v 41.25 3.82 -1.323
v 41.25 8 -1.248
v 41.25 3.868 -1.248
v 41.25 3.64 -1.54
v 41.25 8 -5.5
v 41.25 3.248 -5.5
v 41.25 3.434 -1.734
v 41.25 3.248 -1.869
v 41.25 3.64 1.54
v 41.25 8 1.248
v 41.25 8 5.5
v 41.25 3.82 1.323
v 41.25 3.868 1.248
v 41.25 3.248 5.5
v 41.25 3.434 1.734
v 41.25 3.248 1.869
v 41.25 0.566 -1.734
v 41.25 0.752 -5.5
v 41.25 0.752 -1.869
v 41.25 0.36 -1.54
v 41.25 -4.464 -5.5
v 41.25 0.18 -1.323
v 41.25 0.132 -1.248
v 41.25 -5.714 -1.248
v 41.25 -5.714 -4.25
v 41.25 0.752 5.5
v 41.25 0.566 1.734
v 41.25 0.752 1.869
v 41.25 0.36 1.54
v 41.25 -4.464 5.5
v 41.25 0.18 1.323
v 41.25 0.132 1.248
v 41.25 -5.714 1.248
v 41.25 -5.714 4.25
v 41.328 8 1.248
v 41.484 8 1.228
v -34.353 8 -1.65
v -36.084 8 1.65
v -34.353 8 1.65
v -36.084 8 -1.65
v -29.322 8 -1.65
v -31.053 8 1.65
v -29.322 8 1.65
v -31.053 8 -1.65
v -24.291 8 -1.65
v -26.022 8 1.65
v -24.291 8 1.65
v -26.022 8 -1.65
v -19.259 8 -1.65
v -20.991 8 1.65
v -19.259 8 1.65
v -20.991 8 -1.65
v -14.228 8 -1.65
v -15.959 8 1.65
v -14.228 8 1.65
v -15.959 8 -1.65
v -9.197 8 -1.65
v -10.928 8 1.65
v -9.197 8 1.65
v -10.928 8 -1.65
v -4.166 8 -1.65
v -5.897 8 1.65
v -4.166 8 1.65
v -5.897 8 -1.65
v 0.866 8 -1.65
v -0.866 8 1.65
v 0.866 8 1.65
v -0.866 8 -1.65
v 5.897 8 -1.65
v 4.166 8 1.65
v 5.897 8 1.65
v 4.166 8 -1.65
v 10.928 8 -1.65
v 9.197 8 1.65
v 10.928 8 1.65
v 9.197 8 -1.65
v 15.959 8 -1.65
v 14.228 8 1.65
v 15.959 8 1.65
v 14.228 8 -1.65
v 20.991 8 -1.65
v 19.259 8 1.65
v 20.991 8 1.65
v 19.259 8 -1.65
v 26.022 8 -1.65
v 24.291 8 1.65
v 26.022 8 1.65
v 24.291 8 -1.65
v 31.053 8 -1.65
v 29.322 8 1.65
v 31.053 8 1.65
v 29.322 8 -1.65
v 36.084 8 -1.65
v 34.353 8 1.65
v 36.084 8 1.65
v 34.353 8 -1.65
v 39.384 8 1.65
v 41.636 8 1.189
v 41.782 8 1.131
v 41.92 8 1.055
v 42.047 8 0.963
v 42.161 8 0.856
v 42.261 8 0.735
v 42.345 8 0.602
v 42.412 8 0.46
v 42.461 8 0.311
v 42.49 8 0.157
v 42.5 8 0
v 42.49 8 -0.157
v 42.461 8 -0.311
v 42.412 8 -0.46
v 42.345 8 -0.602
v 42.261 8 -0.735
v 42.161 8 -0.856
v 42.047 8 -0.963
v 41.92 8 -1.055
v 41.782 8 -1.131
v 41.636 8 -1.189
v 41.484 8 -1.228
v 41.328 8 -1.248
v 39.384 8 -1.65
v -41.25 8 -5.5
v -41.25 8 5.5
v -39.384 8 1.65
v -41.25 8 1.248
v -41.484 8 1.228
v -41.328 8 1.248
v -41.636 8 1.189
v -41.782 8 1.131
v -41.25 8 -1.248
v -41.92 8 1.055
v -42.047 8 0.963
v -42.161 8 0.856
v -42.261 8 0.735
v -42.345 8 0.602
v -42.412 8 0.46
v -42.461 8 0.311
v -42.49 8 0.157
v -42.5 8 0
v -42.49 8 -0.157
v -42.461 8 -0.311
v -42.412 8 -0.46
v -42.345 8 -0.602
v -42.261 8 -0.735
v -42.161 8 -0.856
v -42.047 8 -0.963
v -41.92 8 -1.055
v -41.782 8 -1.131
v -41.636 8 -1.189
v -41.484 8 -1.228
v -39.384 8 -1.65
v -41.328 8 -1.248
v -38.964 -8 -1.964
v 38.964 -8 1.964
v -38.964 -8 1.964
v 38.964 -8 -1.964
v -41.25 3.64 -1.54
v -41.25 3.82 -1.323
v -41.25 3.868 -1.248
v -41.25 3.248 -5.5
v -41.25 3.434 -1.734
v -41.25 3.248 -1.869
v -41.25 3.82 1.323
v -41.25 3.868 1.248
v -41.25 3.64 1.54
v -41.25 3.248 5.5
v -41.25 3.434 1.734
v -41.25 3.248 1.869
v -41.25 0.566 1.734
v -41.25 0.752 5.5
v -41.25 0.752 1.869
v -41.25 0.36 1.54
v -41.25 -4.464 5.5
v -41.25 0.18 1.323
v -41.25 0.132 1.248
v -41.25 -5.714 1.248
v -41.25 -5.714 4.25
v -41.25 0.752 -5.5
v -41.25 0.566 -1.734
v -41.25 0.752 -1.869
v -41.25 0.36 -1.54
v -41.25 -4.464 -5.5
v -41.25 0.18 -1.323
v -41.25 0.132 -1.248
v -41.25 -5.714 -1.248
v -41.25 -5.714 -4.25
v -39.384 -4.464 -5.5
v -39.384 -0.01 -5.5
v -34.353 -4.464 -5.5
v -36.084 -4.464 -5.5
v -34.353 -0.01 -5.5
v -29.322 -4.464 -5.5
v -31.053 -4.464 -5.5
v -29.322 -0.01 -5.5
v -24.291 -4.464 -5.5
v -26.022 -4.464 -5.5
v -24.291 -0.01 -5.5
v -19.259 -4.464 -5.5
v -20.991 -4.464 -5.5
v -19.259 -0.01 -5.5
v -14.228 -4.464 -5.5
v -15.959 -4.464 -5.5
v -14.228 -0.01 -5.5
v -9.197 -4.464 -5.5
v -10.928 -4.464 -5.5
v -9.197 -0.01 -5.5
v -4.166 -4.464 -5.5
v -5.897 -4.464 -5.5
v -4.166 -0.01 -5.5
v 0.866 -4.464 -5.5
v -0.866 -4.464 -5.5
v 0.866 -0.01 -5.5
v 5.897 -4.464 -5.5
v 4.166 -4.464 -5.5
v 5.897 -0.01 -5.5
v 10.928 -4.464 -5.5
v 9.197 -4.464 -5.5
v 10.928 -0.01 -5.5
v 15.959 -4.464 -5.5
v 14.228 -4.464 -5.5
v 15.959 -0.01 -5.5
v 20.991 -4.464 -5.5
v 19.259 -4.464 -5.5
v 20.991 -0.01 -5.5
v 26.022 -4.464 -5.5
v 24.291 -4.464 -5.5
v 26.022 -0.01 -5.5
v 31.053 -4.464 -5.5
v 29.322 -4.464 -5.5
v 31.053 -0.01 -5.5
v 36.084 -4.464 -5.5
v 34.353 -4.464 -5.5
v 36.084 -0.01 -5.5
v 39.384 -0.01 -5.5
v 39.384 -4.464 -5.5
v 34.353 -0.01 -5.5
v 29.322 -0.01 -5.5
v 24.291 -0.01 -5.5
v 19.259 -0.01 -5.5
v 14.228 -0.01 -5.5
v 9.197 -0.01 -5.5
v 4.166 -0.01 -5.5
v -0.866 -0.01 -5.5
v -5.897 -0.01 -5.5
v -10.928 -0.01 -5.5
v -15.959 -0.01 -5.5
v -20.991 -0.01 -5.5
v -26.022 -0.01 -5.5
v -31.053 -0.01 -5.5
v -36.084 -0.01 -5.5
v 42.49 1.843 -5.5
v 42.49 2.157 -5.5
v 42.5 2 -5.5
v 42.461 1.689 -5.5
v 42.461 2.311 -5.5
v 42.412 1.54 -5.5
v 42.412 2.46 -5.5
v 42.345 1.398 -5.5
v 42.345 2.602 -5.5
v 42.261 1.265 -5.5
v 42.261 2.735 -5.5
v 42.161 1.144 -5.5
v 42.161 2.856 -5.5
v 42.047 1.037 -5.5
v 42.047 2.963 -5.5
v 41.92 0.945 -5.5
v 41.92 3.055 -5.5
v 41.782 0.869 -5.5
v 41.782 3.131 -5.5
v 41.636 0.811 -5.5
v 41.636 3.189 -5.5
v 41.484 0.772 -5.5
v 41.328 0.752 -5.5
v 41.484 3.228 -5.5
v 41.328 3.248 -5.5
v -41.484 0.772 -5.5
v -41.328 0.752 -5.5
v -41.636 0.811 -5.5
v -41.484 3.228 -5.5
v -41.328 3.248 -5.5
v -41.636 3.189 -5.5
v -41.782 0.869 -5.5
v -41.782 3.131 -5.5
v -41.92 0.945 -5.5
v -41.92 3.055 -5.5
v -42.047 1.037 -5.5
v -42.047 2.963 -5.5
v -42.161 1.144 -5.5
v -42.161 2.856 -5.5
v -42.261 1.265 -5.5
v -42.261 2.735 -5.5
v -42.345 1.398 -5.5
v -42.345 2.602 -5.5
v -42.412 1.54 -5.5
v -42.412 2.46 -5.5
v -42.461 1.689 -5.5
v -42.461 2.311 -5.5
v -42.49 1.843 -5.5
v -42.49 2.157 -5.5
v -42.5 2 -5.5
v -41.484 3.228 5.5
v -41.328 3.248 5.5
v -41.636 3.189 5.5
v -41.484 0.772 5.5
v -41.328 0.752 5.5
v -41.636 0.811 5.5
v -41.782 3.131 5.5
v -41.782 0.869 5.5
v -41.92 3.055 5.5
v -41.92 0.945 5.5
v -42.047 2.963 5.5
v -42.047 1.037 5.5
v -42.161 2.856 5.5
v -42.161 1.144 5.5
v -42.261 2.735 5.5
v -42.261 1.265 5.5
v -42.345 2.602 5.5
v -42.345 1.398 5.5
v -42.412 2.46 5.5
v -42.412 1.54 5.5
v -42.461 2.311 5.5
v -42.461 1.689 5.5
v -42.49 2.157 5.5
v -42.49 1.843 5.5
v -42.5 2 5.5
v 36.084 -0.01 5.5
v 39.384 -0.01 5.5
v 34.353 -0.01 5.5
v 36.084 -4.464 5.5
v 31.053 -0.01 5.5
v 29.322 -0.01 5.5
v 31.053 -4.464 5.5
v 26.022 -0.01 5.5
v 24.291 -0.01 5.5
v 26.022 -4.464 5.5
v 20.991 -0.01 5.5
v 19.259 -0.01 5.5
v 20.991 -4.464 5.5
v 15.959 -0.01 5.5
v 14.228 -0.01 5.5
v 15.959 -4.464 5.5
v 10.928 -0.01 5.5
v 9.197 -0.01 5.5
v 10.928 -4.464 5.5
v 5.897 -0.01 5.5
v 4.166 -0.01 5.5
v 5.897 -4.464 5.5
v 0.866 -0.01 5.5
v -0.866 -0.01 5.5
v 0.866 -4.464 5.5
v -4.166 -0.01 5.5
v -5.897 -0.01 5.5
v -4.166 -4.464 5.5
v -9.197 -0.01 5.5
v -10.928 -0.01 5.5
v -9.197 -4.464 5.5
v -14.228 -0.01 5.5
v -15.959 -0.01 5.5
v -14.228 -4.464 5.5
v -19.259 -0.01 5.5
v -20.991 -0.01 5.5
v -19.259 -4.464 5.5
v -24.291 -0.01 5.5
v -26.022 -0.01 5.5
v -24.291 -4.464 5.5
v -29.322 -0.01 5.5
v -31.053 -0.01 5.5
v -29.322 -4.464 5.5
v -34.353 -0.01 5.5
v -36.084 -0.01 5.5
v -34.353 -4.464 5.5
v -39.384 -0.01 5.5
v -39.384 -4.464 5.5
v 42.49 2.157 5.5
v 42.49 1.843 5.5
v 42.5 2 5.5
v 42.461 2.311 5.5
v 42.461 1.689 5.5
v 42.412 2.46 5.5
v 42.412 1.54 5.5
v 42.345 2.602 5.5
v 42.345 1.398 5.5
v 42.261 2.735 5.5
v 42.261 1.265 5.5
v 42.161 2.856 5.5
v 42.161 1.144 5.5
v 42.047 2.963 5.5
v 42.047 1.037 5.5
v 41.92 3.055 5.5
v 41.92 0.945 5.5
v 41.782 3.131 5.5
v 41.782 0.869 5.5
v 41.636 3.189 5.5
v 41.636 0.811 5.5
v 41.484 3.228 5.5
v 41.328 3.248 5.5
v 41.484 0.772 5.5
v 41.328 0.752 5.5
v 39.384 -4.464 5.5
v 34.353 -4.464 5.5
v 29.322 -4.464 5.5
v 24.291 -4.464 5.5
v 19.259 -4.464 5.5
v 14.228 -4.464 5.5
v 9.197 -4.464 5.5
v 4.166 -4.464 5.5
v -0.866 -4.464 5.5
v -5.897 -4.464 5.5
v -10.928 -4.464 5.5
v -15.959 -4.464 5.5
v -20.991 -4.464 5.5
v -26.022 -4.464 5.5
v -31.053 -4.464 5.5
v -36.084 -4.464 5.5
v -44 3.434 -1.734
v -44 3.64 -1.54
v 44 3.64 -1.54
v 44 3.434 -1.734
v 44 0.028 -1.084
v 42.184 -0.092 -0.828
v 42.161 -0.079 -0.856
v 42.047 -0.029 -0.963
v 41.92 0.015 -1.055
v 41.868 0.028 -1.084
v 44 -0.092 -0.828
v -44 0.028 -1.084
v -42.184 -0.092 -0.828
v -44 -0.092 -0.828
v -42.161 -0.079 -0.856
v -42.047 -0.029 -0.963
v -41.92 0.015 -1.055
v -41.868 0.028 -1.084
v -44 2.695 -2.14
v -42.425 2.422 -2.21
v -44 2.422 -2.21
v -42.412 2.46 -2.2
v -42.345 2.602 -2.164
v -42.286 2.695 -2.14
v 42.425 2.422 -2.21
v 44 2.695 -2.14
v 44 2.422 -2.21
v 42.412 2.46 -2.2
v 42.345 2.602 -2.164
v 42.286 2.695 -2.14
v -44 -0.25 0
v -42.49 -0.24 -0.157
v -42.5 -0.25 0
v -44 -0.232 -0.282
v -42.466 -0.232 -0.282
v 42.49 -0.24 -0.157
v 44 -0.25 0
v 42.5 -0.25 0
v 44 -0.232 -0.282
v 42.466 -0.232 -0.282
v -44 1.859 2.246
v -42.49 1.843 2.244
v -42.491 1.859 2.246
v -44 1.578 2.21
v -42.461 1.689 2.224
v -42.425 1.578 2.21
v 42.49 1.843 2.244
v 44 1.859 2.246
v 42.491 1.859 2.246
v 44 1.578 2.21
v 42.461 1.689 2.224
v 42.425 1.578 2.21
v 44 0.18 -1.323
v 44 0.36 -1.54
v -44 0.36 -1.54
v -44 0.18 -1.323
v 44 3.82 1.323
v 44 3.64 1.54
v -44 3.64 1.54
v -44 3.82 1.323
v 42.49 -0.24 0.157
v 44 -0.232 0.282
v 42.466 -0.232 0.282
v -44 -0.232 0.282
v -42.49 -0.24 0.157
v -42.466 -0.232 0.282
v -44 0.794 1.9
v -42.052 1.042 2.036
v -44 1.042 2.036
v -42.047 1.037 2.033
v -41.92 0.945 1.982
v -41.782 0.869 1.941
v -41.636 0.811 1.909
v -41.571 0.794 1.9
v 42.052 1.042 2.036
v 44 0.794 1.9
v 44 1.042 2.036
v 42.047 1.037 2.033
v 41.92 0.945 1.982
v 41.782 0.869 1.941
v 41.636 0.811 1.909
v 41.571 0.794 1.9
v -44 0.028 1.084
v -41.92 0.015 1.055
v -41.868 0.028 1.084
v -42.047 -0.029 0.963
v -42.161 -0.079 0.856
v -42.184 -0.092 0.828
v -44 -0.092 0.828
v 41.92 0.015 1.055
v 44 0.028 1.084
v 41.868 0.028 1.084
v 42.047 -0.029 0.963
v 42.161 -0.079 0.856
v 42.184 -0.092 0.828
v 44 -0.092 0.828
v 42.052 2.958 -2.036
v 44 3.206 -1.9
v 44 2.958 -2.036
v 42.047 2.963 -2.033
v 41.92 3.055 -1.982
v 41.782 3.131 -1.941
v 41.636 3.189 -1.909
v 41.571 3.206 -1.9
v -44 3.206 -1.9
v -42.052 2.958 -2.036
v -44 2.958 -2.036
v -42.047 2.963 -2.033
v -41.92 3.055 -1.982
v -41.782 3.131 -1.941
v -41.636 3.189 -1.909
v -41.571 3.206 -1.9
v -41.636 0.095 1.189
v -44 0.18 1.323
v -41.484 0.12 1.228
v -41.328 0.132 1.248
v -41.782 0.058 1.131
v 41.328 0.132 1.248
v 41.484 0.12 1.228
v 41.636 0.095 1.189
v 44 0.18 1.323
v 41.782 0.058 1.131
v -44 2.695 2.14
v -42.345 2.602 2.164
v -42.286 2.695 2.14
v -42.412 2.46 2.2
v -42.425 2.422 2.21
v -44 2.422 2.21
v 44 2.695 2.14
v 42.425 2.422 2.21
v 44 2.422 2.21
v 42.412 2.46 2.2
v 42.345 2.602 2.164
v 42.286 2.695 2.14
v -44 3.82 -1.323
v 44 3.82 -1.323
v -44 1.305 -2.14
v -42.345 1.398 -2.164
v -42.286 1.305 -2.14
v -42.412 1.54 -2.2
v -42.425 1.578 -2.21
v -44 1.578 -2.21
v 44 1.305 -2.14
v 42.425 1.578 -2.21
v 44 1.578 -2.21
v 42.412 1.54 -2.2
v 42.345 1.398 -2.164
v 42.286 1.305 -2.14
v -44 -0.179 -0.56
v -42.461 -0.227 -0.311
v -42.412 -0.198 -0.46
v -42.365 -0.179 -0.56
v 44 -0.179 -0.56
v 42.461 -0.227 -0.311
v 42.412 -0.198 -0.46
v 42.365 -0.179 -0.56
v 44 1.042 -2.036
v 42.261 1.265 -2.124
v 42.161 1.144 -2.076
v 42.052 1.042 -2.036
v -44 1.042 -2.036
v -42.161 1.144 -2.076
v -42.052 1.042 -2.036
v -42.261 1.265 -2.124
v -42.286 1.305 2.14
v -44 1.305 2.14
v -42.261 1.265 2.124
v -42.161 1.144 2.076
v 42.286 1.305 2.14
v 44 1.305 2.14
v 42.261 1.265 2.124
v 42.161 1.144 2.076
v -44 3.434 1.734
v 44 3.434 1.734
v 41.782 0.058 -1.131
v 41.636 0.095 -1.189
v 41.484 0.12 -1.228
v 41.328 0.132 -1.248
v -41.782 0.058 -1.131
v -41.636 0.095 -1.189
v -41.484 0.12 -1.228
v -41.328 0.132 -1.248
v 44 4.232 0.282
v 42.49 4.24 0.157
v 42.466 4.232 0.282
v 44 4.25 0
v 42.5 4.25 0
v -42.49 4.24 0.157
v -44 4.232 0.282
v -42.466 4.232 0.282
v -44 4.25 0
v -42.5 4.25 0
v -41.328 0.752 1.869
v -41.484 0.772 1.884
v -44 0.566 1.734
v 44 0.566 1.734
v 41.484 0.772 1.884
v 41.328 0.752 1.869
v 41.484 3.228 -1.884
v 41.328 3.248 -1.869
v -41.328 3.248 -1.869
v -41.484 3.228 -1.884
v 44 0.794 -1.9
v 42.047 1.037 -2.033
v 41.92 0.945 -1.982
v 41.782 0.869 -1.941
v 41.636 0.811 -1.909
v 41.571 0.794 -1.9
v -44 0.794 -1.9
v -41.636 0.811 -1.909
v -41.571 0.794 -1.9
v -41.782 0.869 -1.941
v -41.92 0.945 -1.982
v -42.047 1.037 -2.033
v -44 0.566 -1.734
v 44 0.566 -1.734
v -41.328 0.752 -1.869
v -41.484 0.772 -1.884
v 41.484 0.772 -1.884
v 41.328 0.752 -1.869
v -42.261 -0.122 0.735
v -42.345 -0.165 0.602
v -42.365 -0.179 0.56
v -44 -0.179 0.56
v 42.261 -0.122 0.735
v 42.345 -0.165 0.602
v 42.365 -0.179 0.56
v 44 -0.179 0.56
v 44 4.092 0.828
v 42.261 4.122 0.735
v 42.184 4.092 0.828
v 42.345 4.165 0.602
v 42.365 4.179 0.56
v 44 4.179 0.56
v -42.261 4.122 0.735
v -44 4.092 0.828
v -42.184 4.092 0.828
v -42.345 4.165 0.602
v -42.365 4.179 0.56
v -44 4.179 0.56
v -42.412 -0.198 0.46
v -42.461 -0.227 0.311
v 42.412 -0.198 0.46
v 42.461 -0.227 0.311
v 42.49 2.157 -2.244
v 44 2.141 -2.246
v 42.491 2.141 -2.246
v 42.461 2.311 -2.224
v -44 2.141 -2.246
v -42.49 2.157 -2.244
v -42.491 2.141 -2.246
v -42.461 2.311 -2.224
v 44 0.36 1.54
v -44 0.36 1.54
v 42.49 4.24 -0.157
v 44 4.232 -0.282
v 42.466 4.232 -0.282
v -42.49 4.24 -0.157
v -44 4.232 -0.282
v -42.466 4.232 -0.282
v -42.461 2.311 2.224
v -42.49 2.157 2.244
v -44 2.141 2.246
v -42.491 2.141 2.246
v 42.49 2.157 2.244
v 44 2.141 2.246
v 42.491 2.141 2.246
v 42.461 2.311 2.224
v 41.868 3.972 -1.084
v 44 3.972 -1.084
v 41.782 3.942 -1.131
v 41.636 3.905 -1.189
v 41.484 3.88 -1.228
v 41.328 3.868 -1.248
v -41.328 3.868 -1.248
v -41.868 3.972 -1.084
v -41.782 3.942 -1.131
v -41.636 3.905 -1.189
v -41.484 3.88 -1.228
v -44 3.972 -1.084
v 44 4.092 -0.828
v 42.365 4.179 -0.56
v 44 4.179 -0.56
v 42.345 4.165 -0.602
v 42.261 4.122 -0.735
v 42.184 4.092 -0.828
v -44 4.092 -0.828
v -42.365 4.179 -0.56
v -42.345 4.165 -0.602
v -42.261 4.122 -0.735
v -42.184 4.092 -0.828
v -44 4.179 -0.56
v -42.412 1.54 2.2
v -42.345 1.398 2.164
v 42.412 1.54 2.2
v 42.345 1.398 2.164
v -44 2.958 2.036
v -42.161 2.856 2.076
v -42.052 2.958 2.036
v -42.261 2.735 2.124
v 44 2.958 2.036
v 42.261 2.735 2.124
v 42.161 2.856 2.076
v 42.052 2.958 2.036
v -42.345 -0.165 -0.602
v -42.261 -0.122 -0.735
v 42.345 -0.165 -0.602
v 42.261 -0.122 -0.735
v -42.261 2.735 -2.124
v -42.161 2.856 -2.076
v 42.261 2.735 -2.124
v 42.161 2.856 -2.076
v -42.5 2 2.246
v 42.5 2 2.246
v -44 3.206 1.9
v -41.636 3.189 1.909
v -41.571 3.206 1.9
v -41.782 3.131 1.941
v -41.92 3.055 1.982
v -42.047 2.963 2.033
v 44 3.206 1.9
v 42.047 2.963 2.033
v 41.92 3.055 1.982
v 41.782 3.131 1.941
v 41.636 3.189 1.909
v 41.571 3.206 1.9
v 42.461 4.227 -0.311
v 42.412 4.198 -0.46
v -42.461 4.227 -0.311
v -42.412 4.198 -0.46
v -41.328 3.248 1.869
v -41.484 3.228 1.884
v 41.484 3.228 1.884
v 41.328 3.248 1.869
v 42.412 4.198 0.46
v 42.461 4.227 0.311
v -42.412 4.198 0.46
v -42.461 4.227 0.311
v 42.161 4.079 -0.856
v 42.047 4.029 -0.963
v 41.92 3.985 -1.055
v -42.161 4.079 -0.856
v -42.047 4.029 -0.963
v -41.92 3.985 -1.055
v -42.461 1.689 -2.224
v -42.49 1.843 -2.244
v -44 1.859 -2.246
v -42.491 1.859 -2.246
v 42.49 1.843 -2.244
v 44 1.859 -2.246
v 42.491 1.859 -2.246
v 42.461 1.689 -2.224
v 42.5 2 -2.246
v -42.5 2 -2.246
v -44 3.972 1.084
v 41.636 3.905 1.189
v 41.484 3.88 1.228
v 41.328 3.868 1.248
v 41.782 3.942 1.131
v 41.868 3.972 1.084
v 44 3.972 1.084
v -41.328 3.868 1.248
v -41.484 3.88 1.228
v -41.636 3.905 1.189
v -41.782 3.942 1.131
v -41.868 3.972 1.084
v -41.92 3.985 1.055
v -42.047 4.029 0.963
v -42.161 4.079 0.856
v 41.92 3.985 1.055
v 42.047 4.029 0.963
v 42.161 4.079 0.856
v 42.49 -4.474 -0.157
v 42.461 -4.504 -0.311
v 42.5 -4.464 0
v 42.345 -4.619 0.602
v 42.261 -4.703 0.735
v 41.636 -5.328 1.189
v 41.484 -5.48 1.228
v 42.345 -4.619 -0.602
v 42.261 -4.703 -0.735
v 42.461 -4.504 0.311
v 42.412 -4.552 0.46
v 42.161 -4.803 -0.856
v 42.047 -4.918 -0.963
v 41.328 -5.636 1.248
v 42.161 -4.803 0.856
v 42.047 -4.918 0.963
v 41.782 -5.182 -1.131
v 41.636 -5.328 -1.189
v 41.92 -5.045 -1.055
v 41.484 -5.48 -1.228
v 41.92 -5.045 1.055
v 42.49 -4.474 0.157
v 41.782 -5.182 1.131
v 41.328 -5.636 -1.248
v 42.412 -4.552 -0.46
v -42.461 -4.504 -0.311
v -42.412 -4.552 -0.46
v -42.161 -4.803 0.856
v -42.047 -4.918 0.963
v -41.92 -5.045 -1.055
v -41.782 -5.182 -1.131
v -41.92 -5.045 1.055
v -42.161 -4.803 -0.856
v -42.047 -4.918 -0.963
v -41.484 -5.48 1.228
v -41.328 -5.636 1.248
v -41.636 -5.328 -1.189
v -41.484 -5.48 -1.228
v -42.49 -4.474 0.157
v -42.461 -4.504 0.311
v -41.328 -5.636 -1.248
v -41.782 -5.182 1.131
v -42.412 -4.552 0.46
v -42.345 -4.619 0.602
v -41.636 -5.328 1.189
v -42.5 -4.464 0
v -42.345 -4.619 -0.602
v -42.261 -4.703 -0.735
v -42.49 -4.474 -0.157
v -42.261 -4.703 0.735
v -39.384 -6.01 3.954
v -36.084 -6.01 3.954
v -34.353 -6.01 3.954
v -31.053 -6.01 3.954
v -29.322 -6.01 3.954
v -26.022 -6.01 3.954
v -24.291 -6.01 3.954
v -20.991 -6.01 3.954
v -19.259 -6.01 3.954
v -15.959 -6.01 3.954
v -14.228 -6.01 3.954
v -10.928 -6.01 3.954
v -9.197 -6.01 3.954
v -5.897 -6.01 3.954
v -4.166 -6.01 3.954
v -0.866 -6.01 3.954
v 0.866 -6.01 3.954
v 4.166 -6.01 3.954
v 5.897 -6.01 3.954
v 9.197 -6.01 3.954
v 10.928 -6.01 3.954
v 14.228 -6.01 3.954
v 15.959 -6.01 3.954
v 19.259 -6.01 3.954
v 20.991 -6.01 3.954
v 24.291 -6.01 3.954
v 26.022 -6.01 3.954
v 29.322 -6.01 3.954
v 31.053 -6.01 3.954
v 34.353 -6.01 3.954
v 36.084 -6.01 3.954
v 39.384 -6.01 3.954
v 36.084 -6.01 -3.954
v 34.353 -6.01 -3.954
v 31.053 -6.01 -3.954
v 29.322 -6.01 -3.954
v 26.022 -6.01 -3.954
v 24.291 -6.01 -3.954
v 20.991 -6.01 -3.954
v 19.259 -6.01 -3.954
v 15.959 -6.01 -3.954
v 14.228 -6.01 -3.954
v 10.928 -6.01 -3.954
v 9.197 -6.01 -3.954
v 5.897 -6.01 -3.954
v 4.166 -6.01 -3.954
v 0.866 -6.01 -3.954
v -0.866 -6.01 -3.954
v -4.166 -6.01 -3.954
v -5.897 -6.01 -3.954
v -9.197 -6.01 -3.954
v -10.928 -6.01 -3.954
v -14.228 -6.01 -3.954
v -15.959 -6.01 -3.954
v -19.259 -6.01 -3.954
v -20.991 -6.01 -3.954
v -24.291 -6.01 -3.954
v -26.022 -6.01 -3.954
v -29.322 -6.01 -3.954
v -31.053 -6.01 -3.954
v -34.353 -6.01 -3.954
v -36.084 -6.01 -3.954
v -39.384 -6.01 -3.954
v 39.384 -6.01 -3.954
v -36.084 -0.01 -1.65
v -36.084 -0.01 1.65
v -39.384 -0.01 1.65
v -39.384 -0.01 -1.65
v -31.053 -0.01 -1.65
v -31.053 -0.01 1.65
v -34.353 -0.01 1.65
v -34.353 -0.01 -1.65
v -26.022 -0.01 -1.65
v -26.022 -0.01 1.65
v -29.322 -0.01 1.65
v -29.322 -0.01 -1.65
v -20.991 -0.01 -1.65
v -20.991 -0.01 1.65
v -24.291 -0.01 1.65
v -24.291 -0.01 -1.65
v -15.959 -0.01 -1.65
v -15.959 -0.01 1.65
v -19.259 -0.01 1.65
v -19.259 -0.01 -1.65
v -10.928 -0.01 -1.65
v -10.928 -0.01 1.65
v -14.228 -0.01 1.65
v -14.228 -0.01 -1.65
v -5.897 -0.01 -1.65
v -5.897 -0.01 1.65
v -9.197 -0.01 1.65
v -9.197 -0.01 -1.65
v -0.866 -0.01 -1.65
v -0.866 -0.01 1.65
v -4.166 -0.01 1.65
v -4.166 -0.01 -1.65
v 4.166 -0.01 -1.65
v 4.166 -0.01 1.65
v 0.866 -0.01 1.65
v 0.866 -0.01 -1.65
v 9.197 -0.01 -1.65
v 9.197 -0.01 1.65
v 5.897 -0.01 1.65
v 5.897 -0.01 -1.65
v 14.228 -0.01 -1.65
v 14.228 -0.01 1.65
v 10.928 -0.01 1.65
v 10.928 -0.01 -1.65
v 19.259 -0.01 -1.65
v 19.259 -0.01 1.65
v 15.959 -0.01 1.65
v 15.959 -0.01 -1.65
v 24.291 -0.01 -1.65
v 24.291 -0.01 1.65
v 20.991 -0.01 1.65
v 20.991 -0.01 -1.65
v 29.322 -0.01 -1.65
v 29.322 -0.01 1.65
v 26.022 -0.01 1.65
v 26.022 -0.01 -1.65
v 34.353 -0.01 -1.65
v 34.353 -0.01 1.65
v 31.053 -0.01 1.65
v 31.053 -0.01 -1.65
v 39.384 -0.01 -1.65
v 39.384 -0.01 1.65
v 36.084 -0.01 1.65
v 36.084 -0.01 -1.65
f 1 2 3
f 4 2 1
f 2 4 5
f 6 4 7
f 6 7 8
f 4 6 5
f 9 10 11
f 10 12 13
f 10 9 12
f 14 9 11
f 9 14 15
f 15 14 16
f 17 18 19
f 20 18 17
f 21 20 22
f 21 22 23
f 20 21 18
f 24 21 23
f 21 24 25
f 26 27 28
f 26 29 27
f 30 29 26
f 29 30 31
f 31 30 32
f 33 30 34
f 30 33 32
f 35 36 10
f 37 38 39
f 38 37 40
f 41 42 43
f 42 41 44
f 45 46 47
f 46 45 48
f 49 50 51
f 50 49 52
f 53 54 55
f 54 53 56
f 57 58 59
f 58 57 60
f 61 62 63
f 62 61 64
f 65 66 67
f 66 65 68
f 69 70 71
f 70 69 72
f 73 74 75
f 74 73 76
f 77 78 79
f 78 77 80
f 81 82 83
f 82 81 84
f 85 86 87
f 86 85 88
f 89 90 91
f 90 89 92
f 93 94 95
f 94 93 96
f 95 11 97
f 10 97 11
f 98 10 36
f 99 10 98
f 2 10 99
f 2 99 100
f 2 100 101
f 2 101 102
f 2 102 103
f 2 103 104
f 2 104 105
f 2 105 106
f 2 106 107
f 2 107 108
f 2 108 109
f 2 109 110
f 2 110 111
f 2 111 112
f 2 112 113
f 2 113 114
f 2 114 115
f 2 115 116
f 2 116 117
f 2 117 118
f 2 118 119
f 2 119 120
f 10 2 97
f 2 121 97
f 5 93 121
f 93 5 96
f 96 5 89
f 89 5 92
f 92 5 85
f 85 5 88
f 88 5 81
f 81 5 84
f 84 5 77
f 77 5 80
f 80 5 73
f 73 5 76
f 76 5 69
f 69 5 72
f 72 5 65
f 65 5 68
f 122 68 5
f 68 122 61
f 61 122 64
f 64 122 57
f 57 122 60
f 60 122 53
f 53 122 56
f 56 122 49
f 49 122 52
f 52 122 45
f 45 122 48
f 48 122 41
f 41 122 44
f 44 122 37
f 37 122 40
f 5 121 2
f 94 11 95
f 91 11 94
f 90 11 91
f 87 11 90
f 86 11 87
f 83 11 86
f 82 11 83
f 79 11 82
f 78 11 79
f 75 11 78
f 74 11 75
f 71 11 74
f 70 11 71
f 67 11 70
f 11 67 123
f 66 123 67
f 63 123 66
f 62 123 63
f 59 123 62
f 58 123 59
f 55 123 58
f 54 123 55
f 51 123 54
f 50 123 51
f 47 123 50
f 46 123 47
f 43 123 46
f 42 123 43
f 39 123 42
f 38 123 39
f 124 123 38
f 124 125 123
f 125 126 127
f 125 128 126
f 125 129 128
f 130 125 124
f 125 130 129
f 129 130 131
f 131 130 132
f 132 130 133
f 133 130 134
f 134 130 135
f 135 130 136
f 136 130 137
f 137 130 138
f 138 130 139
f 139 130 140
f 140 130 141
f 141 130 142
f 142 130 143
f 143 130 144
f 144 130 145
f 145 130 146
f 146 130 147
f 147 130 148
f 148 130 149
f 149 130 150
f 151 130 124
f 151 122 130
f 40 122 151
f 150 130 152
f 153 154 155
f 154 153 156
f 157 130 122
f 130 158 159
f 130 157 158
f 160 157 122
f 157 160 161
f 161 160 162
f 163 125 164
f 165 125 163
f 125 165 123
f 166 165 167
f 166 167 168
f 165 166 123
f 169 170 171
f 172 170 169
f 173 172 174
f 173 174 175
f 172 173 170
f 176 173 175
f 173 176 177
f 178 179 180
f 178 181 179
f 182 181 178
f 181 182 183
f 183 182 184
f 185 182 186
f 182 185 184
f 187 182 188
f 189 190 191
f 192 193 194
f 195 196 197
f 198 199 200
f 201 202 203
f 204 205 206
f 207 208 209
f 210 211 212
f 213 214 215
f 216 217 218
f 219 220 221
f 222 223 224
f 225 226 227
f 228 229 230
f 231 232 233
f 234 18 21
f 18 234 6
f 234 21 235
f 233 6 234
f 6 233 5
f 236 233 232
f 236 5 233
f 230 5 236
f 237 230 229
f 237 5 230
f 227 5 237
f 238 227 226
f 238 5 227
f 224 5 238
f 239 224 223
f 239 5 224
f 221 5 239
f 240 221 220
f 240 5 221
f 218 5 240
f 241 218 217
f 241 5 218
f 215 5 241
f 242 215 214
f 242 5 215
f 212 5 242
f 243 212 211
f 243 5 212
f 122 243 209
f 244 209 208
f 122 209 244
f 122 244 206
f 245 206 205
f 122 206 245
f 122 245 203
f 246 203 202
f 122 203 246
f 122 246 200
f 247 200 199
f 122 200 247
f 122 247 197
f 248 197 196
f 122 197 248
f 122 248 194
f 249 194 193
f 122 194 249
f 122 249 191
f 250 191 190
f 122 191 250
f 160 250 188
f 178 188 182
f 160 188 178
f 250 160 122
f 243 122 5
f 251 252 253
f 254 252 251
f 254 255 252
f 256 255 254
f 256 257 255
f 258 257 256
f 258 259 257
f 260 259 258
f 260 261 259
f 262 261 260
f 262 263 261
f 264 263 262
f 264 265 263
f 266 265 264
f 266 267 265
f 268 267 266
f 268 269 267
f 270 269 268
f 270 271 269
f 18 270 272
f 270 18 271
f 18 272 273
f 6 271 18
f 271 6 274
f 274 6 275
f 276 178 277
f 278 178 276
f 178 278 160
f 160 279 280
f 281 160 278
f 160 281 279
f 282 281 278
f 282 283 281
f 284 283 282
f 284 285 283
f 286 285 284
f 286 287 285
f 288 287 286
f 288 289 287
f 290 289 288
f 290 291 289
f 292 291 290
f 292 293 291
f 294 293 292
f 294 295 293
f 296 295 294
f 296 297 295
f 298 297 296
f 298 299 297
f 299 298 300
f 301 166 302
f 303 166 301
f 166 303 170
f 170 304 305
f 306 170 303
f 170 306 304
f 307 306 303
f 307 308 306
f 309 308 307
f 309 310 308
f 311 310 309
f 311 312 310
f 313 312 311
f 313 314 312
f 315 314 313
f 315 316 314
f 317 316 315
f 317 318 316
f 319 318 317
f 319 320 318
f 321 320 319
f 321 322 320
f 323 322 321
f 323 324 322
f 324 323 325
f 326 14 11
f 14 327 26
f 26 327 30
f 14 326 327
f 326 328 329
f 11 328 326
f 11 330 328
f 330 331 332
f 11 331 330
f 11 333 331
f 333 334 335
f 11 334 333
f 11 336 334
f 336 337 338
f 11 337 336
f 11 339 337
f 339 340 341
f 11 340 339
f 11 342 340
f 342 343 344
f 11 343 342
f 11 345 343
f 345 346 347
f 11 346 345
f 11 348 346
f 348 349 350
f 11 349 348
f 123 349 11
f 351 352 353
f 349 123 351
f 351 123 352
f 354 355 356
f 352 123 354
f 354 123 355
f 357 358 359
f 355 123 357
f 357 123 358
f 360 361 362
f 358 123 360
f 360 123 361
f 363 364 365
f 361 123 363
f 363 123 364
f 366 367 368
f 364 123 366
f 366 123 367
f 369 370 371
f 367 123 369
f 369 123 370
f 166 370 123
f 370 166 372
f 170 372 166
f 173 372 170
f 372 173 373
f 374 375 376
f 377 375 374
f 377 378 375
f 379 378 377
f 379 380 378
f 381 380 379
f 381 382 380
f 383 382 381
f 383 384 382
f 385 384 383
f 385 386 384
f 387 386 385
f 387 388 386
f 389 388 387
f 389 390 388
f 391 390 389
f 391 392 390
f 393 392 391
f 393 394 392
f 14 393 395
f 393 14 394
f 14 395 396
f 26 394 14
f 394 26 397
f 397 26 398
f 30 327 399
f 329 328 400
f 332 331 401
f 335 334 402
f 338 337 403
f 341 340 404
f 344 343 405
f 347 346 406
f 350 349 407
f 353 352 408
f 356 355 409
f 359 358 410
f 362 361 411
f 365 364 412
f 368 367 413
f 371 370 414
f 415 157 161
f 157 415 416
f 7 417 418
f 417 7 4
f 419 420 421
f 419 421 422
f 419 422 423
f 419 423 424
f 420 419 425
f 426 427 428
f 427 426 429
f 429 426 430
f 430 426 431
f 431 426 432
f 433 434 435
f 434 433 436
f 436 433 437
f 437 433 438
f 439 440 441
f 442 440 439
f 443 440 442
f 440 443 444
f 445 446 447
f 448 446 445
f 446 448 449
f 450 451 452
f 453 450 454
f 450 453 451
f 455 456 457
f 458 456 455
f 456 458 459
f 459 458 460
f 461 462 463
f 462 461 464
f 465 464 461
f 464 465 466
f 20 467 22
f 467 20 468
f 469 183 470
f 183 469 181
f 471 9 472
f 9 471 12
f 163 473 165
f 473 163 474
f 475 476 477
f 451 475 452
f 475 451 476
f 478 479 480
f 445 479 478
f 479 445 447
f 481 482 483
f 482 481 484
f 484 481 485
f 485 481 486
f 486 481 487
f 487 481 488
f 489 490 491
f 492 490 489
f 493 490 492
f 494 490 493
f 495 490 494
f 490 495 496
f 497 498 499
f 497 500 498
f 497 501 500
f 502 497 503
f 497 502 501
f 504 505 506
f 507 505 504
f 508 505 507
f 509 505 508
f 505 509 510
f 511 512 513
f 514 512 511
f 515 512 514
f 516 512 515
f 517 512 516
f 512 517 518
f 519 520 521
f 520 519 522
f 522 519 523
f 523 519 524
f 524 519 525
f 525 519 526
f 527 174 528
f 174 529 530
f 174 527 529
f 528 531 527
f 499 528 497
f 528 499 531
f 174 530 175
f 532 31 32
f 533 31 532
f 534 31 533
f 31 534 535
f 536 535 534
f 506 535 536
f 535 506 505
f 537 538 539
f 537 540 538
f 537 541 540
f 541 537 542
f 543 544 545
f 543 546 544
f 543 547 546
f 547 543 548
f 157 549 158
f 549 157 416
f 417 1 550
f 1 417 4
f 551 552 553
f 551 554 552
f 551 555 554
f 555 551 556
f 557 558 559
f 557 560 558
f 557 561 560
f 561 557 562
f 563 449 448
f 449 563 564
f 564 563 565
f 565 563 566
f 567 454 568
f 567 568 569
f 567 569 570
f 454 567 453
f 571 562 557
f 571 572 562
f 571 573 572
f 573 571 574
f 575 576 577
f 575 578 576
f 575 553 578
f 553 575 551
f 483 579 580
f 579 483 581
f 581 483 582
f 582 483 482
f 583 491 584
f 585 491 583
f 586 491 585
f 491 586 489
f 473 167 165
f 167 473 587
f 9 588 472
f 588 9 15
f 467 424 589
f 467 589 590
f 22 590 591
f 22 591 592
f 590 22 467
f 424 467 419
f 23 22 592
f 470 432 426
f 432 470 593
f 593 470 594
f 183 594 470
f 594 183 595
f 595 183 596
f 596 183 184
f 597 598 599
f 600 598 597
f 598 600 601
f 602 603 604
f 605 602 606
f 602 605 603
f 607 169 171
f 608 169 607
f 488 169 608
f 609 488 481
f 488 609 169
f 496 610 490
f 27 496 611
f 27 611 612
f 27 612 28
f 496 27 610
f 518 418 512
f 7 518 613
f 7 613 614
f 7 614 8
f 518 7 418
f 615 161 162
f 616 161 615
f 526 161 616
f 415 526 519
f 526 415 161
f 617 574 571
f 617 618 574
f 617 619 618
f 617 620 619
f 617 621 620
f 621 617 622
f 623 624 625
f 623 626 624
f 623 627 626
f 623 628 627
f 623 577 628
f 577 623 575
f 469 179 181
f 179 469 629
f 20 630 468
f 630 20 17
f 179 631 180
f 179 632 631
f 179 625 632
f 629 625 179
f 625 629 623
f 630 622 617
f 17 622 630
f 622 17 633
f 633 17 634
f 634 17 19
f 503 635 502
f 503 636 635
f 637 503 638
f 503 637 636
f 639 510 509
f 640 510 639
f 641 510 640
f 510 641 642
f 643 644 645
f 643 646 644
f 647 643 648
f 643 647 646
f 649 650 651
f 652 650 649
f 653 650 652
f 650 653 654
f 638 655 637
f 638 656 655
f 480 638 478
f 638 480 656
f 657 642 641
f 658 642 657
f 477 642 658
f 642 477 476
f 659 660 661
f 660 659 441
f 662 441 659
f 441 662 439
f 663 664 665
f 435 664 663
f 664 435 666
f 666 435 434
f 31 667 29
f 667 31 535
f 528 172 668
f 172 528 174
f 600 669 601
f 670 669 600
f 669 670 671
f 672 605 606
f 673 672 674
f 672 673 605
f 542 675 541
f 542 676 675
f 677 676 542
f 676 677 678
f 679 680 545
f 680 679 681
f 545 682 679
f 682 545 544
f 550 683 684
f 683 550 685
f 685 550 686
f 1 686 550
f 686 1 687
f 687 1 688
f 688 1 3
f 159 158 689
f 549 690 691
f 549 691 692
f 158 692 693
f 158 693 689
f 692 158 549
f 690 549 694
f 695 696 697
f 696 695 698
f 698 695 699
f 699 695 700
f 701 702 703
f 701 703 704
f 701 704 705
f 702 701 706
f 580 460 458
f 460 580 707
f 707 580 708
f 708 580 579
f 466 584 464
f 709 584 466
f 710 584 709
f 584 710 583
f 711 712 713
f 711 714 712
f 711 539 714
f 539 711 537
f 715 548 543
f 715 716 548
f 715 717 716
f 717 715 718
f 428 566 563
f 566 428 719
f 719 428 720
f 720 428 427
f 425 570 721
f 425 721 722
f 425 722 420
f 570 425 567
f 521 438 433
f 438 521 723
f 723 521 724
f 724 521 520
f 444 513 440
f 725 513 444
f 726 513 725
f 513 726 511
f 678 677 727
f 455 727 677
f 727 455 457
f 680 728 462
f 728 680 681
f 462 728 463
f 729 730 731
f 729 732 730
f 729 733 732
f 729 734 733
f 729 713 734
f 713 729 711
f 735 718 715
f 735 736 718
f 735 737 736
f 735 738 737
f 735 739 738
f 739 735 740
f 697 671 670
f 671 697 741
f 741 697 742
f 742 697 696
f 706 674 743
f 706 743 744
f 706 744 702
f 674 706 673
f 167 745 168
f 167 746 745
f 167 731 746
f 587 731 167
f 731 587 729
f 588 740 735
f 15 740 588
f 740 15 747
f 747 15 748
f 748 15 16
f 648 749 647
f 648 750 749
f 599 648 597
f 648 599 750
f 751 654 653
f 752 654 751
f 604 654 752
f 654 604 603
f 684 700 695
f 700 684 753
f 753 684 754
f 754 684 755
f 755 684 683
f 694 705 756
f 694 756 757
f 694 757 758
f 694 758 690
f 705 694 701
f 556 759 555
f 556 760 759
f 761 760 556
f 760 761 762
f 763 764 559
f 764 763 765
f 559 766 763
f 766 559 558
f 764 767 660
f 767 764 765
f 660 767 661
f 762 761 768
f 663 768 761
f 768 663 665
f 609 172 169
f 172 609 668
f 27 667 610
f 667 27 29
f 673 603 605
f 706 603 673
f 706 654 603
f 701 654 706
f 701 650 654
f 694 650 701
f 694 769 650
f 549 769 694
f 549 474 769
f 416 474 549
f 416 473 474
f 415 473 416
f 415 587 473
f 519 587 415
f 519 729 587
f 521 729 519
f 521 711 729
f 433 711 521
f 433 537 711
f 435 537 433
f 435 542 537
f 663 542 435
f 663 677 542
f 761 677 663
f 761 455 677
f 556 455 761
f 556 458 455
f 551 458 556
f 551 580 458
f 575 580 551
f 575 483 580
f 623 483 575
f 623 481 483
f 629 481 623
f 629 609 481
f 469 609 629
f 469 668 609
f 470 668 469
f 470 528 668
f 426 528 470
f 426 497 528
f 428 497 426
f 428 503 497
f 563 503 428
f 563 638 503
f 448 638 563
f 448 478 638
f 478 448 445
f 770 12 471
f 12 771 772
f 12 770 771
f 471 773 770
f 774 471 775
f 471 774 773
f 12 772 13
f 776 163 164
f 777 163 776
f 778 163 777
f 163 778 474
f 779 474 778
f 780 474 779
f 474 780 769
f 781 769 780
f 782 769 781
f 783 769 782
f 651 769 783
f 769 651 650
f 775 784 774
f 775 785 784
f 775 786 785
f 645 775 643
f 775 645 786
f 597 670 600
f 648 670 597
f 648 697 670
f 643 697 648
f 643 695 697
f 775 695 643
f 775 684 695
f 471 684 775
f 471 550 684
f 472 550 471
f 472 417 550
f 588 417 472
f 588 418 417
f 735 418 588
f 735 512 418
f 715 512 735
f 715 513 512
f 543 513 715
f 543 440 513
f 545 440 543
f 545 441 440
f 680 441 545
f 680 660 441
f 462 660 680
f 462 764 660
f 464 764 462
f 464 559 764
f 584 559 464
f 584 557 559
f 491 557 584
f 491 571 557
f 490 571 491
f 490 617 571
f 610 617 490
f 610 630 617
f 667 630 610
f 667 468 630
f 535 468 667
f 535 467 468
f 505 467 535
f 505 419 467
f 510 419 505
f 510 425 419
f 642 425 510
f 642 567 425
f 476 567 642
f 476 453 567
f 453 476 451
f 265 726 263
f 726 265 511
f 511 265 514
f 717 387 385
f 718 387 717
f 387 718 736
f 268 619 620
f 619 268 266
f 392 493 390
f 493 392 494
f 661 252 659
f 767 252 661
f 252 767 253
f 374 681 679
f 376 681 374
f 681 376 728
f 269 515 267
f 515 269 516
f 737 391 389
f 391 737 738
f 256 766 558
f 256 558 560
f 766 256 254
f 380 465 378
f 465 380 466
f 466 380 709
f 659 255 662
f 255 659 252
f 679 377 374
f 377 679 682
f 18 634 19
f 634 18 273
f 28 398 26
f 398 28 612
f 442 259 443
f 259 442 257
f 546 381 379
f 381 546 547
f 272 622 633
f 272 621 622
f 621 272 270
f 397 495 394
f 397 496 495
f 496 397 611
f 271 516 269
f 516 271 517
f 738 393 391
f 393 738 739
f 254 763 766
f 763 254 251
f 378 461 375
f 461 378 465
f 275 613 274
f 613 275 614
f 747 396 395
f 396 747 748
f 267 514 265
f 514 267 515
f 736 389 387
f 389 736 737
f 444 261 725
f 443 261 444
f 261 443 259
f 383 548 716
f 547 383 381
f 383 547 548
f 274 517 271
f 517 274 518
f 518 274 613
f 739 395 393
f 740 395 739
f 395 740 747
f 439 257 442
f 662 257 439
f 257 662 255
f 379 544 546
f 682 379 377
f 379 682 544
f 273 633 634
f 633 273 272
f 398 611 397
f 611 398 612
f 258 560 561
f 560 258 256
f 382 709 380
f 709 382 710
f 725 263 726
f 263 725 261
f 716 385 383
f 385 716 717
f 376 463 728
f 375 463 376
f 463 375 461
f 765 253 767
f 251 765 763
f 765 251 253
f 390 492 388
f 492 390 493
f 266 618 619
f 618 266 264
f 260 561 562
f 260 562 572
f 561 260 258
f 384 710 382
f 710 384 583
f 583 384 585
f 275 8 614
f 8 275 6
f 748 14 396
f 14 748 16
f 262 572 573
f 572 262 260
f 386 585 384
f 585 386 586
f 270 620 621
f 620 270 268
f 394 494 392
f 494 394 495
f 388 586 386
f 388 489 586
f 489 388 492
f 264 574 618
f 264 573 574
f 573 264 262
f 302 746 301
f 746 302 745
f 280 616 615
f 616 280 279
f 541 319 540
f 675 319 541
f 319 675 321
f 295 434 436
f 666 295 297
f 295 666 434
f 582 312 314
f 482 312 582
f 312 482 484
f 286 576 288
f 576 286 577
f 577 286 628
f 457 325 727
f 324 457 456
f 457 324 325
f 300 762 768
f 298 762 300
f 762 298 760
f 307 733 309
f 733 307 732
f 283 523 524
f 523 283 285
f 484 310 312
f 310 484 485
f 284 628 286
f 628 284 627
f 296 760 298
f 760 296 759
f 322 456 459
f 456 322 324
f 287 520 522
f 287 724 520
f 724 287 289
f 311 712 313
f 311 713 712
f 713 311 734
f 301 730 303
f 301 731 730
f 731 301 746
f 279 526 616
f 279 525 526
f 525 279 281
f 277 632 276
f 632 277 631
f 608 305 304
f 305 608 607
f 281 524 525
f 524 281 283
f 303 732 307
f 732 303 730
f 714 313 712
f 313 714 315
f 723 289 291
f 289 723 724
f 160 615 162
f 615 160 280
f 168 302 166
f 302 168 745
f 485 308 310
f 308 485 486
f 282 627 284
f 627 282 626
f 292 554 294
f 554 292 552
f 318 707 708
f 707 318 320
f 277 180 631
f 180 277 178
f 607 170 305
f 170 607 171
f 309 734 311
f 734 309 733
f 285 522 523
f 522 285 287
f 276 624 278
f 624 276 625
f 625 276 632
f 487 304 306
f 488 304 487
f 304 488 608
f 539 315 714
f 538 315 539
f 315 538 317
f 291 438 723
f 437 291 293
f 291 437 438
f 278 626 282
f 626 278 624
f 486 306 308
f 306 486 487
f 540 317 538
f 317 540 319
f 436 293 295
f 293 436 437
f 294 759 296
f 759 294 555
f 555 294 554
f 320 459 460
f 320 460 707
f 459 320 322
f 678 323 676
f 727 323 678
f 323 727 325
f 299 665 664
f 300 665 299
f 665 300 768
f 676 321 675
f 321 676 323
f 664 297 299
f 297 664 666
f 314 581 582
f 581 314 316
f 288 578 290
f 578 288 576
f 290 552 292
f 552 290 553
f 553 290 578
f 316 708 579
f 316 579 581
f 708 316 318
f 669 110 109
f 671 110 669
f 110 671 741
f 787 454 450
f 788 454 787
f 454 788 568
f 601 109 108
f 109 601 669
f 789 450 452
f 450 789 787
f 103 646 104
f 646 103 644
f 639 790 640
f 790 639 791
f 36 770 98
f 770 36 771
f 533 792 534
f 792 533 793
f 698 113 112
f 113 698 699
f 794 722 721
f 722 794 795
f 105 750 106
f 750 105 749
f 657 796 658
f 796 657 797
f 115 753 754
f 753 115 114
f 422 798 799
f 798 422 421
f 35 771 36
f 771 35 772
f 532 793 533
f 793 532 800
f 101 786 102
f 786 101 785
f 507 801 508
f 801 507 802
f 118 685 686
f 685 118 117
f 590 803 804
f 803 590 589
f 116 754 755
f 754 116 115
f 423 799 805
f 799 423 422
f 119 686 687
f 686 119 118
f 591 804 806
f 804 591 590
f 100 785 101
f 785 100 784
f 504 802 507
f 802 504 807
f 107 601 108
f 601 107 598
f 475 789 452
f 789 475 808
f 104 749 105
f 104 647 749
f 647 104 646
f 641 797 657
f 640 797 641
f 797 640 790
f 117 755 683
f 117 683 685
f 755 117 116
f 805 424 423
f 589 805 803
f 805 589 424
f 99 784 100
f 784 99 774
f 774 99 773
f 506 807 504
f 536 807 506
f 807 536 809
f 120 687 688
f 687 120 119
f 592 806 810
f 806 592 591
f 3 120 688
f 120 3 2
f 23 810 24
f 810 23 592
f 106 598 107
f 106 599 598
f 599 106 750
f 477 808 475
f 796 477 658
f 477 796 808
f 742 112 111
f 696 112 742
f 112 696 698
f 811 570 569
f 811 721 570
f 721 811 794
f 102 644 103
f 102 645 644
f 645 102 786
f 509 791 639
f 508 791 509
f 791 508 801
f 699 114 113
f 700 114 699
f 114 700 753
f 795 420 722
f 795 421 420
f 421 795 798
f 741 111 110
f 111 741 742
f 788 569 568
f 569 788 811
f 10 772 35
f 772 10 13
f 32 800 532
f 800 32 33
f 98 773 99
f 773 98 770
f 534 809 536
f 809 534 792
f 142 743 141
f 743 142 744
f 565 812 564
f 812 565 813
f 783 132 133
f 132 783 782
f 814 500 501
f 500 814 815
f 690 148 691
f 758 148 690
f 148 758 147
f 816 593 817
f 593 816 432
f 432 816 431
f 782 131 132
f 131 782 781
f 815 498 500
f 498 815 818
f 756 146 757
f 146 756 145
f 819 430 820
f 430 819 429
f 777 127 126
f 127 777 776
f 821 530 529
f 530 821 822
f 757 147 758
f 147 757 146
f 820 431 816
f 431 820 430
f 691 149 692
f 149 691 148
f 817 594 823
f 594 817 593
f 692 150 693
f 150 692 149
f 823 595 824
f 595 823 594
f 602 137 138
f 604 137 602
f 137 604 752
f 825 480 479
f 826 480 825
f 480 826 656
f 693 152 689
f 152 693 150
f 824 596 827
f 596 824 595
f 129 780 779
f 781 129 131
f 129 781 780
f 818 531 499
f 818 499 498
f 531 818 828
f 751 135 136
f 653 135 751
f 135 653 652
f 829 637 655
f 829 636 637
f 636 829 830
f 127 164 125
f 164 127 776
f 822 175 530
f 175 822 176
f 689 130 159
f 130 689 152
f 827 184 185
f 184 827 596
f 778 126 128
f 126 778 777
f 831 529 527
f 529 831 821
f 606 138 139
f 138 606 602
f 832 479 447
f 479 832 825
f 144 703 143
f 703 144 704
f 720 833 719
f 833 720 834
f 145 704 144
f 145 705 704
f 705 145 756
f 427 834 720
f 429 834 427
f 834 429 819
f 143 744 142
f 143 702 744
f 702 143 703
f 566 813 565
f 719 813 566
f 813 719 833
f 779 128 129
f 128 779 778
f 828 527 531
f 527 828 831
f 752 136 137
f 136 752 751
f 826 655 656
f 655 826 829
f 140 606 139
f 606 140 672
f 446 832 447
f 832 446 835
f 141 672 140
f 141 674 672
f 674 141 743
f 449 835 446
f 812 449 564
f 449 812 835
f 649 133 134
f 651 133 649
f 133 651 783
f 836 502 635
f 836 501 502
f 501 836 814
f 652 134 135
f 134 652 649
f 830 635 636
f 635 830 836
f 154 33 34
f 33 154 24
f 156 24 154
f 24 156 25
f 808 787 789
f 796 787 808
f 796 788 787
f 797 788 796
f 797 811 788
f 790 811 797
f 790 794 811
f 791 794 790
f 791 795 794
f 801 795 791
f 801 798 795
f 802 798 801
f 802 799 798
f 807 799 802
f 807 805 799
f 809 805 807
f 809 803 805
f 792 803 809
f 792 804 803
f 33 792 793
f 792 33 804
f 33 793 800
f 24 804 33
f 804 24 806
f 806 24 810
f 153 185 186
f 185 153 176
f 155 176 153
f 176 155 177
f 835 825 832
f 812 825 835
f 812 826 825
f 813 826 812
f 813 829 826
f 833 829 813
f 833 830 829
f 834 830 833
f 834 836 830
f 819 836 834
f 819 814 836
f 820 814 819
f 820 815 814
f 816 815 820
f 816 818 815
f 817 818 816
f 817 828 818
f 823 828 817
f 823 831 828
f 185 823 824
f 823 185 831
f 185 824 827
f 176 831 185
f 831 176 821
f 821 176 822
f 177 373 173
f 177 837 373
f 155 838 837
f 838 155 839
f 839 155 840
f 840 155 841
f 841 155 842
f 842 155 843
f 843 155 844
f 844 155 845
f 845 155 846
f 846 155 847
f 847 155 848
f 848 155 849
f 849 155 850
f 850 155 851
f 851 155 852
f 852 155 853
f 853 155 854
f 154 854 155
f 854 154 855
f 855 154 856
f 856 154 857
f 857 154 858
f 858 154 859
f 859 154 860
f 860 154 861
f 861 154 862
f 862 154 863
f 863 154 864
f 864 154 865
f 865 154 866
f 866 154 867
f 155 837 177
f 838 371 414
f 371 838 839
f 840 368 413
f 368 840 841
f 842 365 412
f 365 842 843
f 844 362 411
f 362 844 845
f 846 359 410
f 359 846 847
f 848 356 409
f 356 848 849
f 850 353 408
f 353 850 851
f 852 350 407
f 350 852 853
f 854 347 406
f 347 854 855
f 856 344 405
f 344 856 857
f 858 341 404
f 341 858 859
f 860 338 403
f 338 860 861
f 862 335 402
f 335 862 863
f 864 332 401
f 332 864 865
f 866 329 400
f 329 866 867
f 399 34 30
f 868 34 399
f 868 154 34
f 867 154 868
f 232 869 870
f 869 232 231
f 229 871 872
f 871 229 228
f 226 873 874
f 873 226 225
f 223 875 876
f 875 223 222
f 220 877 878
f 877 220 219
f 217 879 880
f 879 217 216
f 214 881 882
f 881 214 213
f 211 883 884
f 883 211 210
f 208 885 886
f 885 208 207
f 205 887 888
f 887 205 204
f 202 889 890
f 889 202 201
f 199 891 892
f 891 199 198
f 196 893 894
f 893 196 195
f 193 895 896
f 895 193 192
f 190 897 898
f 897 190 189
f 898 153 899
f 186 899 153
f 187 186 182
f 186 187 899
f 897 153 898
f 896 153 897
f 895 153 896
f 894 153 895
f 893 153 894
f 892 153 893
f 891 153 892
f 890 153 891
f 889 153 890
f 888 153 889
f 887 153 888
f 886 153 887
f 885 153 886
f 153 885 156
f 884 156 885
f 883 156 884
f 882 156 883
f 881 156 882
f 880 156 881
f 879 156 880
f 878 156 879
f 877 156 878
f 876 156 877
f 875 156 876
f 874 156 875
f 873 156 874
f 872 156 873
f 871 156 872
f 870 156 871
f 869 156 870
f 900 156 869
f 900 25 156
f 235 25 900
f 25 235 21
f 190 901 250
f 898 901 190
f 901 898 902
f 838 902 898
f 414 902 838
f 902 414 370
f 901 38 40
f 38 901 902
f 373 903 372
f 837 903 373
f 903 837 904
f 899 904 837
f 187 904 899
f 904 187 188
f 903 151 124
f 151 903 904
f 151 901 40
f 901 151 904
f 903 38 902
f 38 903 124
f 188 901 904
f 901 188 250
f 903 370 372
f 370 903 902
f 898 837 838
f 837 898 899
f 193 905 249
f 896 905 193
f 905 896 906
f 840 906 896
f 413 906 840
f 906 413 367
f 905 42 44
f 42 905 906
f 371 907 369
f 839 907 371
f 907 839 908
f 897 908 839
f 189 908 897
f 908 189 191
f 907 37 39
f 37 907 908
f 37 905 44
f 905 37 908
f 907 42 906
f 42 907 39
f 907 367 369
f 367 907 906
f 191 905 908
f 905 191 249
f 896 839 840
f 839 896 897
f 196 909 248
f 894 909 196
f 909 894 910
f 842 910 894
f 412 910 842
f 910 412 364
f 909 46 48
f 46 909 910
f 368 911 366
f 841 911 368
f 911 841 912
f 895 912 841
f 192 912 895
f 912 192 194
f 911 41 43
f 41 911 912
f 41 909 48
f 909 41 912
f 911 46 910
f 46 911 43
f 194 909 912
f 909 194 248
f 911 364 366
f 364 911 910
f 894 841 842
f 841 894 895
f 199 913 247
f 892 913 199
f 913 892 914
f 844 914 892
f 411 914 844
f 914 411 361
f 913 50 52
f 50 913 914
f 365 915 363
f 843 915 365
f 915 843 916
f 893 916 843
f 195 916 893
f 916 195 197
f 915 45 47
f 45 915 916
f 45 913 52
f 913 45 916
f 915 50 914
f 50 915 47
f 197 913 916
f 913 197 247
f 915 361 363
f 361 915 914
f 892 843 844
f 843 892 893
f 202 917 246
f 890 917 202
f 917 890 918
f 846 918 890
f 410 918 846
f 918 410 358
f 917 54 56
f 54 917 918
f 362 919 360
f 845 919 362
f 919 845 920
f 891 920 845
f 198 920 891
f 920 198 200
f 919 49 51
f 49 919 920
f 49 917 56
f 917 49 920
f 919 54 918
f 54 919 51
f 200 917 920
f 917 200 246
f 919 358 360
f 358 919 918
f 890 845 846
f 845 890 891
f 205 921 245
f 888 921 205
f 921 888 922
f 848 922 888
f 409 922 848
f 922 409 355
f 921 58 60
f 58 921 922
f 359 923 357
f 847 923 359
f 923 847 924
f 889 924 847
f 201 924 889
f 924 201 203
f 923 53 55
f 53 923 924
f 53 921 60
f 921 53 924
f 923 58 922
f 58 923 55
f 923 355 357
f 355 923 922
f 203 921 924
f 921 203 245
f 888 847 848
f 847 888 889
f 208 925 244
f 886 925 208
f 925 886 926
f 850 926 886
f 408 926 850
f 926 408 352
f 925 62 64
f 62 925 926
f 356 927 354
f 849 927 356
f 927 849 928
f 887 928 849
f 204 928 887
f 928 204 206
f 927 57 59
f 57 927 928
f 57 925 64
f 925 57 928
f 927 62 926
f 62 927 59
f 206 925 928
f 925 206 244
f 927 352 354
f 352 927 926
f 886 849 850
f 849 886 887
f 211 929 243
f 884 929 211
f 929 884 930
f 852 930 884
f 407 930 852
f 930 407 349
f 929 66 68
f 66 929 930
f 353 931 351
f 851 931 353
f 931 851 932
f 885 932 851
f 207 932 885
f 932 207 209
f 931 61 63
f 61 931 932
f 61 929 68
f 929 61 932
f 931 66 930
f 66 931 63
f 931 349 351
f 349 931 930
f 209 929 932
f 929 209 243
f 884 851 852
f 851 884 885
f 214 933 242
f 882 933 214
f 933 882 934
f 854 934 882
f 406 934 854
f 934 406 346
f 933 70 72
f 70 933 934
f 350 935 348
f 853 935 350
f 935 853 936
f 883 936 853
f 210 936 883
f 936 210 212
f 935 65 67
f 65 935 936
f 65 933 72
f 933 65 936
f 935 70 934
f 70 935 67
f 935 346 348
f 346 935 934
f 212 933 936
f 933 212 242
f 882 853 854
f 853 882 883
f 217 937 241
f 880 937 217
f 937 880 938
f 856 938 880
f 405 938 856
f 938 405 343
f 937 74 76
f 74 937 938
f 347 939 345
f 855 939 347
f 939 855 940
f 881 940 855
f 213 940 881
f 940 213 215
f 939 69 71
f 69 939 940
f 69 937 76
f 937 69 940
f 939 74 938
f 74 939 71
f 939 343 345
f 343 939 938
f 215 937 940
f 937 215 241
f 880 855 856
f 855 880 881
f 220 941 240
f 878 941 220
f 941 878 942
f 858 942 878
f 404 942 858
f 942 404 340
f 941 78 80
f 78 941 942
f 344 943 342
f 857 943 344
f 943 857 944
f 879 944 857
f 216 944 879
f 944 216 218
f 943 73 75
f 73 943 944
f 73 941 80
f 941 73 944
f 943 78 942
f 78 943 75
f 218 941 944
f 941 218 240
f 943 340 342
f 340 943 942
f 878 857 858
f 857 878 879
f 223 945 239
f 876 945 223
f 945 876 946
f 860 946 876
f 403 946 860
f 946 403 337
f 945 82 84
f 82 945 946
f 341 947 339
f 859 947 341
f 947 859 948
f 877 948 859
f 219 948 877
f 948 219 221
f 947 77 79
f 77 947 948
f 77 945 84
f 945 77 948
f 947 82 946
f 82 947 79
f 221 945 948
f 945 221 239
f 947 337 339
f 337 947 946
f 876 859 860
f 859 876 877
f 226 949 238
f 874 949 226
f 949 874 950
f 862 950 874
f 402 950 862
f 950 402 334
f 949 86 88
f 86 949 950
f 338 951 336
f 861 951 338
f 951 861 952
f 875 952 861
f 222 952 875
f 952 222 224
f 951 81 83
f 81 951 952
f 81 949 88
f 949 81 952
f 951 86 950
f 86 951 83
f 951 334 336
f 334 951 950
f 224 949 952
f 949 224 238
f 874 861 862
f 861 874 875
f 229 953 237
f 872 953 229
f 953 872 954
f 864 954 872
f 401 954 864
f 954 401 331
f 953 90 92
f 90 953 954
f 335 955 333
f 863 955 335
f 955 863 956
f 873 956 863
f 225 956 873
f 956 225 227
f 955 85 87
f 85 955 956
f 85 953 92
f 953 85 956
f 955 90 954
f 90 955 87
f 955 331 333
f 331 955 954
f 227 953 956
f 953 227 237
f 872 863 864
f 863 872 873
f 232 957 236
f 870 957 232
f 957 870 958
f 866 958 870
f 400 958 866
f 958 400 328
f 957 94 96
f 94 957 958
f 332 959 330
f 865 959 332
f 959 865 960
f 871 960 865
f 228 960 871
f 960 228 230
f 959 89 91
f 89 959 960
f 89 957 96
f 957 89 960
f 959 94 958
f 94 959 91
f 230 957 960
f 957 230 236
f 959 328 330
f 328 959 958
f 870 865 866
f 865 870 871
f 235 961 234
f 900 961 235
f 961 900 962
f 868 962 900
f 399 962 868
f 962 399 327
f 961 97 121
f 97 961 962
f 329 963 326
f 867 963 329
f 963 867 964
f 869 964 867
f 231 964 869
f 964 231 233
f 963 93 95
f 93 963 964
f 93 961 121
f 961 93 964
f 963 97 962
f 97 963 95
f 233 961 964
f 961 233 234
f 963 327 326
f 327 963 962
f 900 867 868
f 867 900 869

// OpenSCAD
/************** BEST VIEWED IN A CODE EDITOR 80 COLUMNS WIDE *******************
*
* Milwaukee Dremel Bit Holders
* Benjamen Johnson <workshop.electronsmith.com>
* 20190913
* Version 5
* openSCAD Version: 2015.03-2
*******************************************************************************/
/*[Global]*/
// number of slots for bits
num_slots = 16 ; //[1:12]

/*[Holder Parameters]*/
/*******************************************************************************
*    /\ /\ /\ /\ /\ /\ /\ /\ /\ /\  < ---- bits
*   -------------------------------  --
*  |                               |  body_height 
*  |                               |
*   -------------------------------  --
*  |< ------- body_width --------->|
*   -------------------------------  --
*  | X  X  X  X  X  X  X  X  X  X  |  body_depth
*   -------------------------------  --
*
*  || <- min_edge
*   -----------
*  | --- | --- | --
*  ||   |||   ||  slot_width
*  | --- | --- | --
*   -----------
*         |   | <- slot_length (I know these seem backward in 2D)
*  
*******************************************************************************/
// width of the holder body
body_width = 82.5 ; // 82.5

// depth of holder 
body_depth = 11; // 11

// height of holder
body_height = 16;// length of the bit slot (side to side)

// length of slot (side to side)
slot_length = 3.3;

// width of the bit slot (front to back)
slot_width = 3.3;

// how much material to leave at the bottom of the bit slots
bottom_thickness = 2;

// how much to chamfer the ends
bottom_chamfer = 5;

// minimum wall thickness at the edge of the holder
min_edge = 1;

/*[Connector Parameters]*/
/*******************************************************************************
*     -------------------------------
*   -| X  X  X  X  X  X  X  X  X  X  |-
*     -------------------------------
*  | <------ total_pin_length -------->|
*
*             -------
*        --  |---O---|  o <- pin_dia (diamter of pivot pin)
* pin_height |   |   | 
*            |   |   |    <- catch_dia (diameter of the semicircular catches)
*        --   -------
******************************************************************************/
// Length of cylinder passing through the holder that it rotates on 
total_pin_length = 88; // 88

// diameter of the above cylinder
pin_dia = 4.5; // 4.5

// diameter of the semicircular catches
catch_dia = 2.5;

// pin distance from the bottom of holder;
pin_height = 10; 

/*[Expert]*/
// add a slight offset to cuts to make model render properly
render_offset = 0.01; //0.005

/*[Hidden]*/
front_window_height = 6;

rotate([-90,0,0])
difference(){
    
    // make the basic holder
    MilwaukeeHolder();
           
    //calculations for positioning the slots
    width2= body_width - 2 * min_edge;
    step = width2 /(num_slots);
    start = -width2/2+step/2;
    end = width2/2;
        
    // cut the slots for the bits
    for (x=[start:step:end]){
        translate([x,0,bottom_thickness])cube([slot_length,slot_width,body_height], center=true);
        translate([x,0,-(body_height-front_window_height)/2-render_offset+bottom_thickness])cube([slot_length,body_depth+render_offset,front_window_height],center=true);
    }// end for    

}// end union

module MilwaukeeHolder(){
   
    // calculate where to put the pin
    pin_pos = - body_height/2+pin_height;

    difference(){
        union(){
            // Form the main body
            cube([body_width,body_depth,body_height],center = true);
                    
            // form the pivot pins
            translate([0,0,pin_pos])rotate([0,90,0])cylinder(d=pin_dia,h=total_pin_length,center=true,$fn=50);
            
            //form the horizontal catches
            translate([body_width/2,0,pin_pos])rotate([90,0,0])cylinder(d=catch_dia,h=body_depth,center=true,$fn=50);
            translate([-body_width/2,0,pin_pos])rotate([90,0,0])cylinder(d=catch_dia,h=body_depth,center=true,$fn=50);
            
            //form the vertical catches
            translate([body_width/2,0,0])rotate([0,0,0])cylinder(d=catch_dia,h=body_height,center=true,$fn=50);
            translate([-body_width/2,0,0])rotate([0,0,0])cylinder(d=catch_dia,h=body_height,center=true,$fn=50);
        } // end union
        
        //cut off bottom corners
        translate([(body_width+catch_dia)/2,0,-body_height/2])rotate([0,45,0])cube([bottom_chamfer,body_depth+render_offset,bottom_chamfer],center=true);
        translate([-(body_width+catch_dia)/2,0,-body_height/2])rotate([0,45,0])cube([bottom_chamfer,body_depth+render_offset,bottom_chamfer],center=true);
        translate([0,-body_depth/2,-body_height/2])rotate([45,0,0])cube([body_width+render_offset, bottom_chamfer ,bottom_chamfer],center=true);
        translate([0,body_depth/2,-body_height/2])rotate([45,0,0])cube([body_width+render_offset, bottom_chamfer ,bottom_chamfer],center=true);     
    
    }//end difference
} // end module
